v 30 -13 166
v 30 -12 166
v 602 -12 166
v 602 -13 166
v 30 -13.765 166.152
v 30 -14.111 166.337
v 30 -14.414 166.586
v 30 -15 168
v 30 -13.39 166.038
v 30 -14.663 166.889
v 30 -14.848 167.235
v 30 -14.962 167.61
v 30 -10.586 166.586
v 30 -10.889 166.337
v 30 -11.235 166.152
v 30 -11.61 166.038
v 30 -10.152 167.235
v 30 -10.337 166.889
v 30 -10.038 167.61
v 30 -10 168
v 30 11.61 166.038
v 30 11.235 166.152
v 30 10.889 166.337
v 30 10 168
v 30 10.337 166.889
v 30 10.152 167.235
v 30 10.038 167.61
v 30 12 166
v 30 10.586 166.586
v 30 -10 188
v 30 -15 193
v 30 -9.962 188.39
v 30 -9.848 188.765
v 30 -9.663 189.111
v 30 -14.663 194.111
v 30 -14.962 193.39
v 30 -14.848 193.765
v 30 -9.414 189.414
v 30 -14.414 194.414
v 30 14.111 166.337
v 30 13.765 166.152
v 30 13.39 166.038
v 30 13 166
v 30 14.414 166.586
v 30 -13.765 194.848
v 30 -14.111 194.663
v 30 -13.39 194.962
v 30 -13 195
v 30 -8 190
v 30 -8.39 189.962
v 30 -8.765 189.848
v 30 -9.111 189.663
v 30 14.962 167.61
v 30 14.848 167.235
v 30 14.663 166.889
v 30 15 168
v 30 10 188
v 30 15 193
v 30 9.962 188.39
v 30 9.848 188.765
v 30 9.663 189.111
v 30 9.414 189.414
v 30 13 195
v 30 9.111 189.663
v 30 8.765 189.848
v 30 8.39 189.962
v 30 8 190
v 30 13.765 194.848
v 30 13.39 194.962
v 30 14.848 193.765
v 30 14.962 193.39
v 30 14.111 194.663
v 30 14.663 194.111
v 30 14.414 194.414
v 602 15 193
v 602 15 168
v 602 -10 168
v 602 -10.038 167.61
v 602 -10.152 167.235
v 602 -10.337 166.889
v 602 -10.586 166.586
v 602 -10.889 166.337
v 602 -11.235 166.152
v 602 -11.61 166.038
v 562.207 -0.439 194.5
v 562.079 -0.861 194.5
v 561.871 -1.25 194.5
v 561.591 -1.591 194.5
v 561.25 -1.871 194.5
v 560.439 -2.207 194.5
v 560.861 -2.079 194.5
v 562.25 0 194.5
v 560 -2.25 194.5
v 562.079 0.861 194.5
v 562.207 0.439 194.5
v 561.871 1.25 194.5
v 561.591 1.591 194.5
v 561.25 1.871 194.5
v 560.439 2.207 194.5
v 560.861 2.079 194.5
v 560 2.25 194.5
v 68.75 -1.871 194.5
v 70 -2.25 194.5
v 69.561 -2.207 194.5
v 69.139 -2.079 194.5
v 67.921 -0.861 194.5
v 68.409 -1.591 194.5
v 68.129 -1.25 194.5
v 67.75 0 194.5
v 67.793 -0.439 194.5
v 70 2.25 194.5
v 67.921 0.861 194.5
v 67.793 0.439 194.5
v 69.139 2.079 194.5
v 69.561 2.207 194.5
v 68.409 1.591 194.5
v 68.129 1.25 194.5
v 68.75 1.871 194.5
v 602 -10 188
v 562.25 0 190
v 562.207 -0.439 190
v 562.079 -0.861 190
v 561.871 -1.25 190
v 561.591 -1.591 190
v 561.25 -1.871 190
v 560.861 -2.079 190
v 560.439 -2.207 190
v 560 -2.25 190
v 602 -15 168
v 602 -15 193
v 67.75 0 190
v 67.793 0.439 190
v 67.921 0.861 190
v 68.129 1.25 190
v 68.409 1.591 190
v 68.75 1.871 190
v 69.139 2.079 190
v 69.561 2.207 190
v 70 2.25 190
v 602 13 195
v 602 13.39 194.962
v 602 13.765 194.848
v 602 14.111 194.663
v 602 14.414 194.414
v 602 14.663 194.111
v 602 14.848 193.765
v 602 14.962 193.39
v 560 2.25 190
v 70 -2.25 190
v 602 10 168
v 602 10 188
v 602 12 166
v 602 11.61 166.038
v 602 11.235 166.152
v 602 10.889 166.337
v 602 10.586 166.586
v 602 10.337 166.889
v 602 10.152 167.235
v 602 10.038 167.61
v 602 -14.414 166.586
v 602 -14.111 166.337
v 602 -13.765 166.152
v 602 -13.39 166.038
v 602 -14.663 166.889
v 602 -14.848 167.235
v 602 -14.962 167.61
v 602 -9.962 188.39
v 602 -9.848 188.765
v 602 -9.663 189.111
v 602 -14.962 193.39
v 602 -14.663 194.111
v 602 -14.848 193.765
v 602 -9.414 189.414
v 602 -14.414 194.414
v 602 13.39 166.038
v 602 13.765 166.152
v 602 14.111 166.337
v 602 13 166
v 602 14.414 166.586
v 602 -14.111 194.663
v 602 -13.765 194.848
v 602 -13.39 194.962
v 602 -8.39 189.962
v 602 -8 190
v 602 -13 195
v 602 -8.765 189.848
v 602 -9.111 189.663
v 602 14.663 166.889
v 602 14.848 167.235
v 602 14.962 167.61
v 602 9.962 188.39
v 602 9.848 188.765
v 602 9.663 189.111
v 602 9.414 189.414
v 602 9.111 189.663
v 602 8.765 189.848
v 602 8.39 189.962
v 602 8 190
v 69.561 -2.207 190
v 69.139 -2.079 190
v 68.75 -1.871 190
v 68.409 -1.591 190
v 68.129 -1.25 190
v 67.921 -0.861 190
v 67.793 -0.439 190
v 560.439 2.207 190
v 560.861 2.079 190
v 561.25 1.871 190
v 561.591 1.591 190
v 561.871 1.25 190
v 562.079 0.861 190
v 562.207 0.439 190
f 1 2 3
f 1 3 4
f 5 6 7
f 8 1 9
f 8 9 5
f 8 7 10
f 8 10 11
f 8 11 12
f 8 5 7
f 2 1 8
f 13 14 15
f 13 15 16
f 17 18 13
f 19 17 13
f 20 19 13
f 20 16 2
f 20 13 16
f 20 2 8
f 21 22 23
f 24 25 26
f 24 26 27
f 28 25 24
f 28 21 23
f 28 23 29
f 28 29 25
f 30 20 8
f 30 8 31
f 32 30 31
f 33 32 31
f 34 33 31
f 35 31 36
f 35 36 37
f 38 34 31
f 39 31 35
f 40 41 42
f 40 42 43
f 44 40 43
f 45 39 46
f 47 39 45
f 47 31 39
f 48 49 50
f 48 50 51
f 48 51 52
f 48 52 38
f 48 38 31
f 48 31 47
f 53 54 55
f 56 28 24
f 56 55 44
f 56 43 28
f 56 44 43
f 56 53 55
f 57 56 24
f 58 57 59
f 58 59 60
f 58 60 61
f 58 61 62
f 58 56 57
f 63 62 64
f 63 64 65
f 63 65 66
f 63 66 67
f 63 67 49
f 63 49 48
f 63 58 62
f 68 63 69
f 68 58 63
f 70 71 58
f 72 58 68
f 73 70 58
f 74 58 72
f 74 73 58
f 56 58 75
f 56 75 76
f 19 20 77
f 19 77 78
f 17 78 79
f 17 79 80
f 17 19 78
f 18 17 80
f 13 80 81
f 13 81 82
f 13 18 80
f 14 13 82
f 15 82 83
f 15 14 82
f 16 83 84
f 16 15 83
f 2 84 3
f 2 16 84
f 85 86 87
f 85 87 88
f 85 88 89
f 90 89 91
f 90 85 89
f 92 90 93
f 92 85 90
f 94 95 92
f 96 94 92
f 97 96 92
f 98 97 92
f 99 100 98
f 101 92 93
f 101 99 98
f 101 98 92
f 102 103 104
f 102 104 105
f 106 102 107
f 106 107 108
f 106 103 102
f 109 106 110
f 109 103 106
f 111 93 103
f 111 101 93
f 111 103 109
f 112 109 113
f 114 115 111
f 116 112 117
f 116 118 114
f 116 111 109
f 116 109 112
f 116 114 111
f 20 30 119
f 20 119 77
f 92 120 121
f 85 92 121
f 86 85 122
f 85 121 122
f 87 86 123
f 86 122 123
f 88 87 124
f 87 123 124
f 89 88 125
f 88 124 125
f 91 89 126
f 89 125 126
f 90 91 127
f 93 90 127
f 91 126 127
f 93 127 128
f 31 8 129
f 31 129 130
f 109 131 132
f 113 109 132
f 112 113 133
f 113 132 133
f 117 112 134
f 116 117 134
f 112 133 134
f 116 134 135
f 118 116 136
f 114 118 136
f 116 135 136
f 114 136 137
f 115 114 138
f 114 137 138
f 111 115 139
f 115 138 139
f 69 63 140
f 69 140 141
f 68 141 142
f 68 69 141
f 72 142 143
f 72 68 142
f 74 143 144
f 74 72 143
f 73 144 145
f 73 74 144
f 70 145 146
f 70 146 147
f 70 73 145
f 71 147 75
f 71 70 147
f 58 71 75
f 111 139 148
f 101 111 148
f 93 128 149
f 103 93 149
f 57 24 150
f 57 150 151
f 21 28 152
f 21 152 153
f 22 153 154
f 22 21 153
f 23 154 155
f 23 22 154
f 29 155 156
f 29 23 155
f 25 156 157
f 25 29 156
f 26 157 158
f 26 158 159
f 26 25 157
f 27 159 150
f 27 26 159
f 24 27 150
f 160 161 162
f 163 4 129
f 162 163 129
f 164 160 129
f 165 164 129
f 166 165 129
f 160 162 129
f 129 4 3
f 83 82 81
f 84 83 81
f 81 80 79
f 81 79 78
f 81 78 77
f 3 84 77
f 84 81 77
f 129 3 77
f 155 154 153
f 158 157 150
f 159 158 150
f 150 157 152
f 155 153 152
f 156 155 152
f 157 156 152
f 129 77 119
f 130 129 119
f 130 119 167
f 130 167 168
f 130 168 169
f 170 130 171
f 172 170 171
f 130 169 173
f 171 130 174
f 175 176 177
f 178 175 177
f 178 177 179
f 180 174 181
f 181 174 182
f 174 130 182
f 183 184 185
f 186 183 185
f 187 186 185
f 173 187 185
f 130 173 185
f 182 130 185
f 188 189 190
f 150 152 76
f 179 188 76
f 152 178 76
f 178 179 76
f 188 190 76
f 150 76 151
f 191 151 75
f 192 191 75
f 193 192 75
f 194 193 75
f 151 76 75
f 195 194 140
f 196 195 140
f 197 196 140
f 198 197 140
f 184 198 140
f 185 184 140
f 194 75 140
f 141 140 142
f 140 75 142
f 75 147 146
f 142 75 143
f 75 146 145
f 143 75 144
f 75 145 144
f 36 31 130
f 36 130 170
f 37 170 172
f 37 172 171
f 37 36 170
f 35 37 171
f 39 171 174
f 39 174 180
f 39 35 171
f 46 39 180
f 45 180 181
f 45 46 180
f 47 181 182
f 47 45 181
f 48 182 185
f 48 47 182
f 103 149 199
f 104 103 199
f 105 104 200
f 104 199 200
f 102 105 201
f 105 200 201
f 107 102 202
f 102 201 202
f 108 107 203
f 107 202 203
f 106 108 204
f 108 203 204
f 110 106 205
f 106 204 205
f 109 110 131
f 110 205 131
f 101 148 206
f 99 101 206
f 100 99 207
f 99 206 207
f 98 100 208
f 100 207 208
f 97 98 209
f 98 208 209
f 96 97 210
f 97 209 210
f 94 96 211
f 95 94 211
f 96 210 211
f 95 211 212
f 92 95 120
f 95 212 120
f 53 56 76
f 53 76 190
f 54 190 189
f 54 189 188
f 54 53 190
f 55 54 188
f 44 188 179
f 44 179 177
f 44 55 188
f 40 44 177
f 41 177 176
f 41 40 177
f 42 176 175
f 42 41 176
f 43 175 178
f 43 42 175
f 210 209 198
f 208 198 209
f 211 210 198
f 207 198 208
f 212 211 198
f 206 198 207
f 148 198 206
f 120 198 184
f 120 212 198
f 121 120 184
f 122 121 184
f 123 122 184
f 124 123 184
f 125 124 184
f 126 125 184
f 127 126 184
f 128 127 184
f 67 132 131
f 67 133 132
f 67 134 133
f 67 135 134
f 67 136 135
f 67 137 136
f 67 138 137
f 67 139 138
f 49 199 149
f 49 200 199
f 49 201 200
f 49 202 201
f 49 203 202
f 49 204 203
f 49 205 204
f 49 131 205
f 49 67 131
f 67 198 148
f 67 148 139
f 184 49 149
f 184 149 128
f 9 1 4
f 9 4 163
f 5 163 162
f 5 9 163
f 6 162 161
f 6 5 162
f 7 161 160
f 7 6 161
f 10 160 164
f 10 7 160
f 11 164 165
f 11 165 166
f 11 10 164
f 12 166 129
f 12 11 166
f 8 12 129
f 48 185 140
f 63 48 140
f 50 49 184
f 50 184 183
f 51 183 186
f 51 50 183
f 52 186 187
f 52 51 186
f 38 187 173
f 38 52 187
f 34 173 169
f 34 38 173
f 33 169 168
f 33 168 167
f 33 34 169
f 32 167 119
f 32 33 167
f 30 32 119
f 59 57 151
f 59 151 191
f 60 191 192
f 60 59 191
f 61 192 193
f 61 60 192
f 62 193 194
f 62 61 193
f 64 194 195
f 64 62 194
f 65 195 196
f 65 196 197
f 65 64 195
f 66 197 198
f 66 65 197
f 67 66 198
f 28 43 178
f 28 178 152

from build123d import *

# Parameters (mm, degrees)
BOSS_EXTRUDE1_START = 30
BOSS_EXTRUDE1_DEPTH = 572
CUT_EXTRUDE1_DEPTH  = 4.5


with BuildPart() as part:
    # Sketch1 → Boss-Extrude1 (new body)
    with BuildSketch(Plane(origin=(0, 0, 0), x_dir=(0, 0, -1), z_dir=(1, 0, 0)).offset(BOSS_EXTRUDE1_START)):
        with BuildLine():
            Line((-168, 10), (-188, 10))
            ThreePointArc((-188, 10), (-189.414213562, 9.414213562), (-190, 8))
            Line((-190, 8), (-190, -8))
            ThreePointArc((-190, -8), (-189.414213562, -9.414213562), (-188, -10))
            Line((-188, -10), (-168, -10))
            ThreePointArc((-168, -10), (-166.585786438, -10.585786438), (-166, -12))
            Line((-166, -12), (-166, -13))
            ThreePointArc((-166, -13), (-166.585786438, -14.414213562), (-168, -15))
            Line((-168, -15), (-193, -15))
            ThreePointArc((-193, -15), (-194.414213562, -14.414213562), (-195, -13))
            Line((-195, -13), (-195, 13))
            ThreePointArc((-195, 13), (-194.414213562, 14.414213562), (-193, 15))
            Line((-193, 15), (-168, 15))
            ThreePointArc((-168, 15), (-166.585786438, 14.414213562), (-166, 13))
            Line((-166, 13), (-166, 12))
            ThreePointArc((-166, 12), (-166.585786438, 10.585786438), (-168, 10))
        make_face()
    extrude(amount=BOSS_EXTRUDE1_DEPTH)

    # Sketch2 → Cut-Extrude1 (cut)
    with BuildSketch(Plane(origin=(0, 0, 190), x_dir=(-1, 0, 0), z_dir=(0, 0, -1))):
        with BuildLine():
            ThreePointArc((-67.75, 0), (-68.409009742, 1.590990258), (-70, 2.25))
            Line((-70, 2.25), (-560, 2.25))
            ThreePointArc((-560, 2.25), (-561.590990258, 1.590990258), (-562.25, 0))
            Line((-562.25, 0), (-67.75, 0))
        make_face()
        with BuildLine():
            ThreePointArc((-70, -2.25), (-68.409009742, -1.590990258), (-67.75, 0))
            Line((-67.75, 0), (-562.25, 0))
            ThreePointArc((-562.25, 0), (-561.590990258, -1.590990258), (-560, -2.25))
            Line((-560, -2.25), (-70, -2.25))
        make_face()
    extrude(amount=-CUT_EXTRUDE1_DEPTH, mode=Mode.SUBTRACT)


solid = part.part
